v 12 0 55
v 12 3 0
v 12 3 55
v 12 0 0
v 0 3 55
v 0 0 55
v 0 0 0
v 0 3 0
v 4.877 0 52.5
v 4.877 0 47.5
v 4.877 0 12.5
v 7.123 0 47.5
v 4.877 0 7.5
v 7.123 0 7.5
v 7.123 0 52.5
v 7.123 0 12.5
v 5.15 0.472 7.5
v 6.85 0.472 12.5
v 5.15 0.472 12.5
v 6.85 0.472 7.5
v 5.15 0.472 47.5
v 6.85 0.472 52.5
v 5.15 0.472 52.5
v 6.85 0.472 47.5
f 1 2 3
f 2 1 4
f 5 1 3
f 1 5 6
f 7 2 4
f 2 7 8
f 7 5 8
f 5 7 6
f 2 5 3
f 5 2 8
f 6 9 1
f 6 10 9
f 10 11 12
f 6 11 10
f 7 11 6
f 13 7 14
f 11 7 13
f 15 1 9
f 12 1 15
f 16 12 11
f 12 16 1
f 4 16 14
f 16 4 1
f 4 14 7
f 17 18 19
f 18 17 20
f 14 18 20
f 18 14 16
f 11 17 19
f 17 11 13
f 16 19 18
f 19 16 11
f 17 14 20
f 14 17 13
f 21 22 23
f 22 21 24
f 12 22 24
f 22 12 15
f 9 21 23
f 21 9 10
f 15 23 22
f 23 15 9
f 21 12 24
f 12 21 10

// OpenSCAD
difference() {
	cube(size = [12.0, 3.0, 55.0]);
	translate(v = [6.0, -1, 7.5]) {
		cylinder(d = 3.4, h = 5.0);
	}
	translate(v = [6.0, -1, 47.5]) {
		cylinder(d = 3.4, h = 5.0);
	}
}
